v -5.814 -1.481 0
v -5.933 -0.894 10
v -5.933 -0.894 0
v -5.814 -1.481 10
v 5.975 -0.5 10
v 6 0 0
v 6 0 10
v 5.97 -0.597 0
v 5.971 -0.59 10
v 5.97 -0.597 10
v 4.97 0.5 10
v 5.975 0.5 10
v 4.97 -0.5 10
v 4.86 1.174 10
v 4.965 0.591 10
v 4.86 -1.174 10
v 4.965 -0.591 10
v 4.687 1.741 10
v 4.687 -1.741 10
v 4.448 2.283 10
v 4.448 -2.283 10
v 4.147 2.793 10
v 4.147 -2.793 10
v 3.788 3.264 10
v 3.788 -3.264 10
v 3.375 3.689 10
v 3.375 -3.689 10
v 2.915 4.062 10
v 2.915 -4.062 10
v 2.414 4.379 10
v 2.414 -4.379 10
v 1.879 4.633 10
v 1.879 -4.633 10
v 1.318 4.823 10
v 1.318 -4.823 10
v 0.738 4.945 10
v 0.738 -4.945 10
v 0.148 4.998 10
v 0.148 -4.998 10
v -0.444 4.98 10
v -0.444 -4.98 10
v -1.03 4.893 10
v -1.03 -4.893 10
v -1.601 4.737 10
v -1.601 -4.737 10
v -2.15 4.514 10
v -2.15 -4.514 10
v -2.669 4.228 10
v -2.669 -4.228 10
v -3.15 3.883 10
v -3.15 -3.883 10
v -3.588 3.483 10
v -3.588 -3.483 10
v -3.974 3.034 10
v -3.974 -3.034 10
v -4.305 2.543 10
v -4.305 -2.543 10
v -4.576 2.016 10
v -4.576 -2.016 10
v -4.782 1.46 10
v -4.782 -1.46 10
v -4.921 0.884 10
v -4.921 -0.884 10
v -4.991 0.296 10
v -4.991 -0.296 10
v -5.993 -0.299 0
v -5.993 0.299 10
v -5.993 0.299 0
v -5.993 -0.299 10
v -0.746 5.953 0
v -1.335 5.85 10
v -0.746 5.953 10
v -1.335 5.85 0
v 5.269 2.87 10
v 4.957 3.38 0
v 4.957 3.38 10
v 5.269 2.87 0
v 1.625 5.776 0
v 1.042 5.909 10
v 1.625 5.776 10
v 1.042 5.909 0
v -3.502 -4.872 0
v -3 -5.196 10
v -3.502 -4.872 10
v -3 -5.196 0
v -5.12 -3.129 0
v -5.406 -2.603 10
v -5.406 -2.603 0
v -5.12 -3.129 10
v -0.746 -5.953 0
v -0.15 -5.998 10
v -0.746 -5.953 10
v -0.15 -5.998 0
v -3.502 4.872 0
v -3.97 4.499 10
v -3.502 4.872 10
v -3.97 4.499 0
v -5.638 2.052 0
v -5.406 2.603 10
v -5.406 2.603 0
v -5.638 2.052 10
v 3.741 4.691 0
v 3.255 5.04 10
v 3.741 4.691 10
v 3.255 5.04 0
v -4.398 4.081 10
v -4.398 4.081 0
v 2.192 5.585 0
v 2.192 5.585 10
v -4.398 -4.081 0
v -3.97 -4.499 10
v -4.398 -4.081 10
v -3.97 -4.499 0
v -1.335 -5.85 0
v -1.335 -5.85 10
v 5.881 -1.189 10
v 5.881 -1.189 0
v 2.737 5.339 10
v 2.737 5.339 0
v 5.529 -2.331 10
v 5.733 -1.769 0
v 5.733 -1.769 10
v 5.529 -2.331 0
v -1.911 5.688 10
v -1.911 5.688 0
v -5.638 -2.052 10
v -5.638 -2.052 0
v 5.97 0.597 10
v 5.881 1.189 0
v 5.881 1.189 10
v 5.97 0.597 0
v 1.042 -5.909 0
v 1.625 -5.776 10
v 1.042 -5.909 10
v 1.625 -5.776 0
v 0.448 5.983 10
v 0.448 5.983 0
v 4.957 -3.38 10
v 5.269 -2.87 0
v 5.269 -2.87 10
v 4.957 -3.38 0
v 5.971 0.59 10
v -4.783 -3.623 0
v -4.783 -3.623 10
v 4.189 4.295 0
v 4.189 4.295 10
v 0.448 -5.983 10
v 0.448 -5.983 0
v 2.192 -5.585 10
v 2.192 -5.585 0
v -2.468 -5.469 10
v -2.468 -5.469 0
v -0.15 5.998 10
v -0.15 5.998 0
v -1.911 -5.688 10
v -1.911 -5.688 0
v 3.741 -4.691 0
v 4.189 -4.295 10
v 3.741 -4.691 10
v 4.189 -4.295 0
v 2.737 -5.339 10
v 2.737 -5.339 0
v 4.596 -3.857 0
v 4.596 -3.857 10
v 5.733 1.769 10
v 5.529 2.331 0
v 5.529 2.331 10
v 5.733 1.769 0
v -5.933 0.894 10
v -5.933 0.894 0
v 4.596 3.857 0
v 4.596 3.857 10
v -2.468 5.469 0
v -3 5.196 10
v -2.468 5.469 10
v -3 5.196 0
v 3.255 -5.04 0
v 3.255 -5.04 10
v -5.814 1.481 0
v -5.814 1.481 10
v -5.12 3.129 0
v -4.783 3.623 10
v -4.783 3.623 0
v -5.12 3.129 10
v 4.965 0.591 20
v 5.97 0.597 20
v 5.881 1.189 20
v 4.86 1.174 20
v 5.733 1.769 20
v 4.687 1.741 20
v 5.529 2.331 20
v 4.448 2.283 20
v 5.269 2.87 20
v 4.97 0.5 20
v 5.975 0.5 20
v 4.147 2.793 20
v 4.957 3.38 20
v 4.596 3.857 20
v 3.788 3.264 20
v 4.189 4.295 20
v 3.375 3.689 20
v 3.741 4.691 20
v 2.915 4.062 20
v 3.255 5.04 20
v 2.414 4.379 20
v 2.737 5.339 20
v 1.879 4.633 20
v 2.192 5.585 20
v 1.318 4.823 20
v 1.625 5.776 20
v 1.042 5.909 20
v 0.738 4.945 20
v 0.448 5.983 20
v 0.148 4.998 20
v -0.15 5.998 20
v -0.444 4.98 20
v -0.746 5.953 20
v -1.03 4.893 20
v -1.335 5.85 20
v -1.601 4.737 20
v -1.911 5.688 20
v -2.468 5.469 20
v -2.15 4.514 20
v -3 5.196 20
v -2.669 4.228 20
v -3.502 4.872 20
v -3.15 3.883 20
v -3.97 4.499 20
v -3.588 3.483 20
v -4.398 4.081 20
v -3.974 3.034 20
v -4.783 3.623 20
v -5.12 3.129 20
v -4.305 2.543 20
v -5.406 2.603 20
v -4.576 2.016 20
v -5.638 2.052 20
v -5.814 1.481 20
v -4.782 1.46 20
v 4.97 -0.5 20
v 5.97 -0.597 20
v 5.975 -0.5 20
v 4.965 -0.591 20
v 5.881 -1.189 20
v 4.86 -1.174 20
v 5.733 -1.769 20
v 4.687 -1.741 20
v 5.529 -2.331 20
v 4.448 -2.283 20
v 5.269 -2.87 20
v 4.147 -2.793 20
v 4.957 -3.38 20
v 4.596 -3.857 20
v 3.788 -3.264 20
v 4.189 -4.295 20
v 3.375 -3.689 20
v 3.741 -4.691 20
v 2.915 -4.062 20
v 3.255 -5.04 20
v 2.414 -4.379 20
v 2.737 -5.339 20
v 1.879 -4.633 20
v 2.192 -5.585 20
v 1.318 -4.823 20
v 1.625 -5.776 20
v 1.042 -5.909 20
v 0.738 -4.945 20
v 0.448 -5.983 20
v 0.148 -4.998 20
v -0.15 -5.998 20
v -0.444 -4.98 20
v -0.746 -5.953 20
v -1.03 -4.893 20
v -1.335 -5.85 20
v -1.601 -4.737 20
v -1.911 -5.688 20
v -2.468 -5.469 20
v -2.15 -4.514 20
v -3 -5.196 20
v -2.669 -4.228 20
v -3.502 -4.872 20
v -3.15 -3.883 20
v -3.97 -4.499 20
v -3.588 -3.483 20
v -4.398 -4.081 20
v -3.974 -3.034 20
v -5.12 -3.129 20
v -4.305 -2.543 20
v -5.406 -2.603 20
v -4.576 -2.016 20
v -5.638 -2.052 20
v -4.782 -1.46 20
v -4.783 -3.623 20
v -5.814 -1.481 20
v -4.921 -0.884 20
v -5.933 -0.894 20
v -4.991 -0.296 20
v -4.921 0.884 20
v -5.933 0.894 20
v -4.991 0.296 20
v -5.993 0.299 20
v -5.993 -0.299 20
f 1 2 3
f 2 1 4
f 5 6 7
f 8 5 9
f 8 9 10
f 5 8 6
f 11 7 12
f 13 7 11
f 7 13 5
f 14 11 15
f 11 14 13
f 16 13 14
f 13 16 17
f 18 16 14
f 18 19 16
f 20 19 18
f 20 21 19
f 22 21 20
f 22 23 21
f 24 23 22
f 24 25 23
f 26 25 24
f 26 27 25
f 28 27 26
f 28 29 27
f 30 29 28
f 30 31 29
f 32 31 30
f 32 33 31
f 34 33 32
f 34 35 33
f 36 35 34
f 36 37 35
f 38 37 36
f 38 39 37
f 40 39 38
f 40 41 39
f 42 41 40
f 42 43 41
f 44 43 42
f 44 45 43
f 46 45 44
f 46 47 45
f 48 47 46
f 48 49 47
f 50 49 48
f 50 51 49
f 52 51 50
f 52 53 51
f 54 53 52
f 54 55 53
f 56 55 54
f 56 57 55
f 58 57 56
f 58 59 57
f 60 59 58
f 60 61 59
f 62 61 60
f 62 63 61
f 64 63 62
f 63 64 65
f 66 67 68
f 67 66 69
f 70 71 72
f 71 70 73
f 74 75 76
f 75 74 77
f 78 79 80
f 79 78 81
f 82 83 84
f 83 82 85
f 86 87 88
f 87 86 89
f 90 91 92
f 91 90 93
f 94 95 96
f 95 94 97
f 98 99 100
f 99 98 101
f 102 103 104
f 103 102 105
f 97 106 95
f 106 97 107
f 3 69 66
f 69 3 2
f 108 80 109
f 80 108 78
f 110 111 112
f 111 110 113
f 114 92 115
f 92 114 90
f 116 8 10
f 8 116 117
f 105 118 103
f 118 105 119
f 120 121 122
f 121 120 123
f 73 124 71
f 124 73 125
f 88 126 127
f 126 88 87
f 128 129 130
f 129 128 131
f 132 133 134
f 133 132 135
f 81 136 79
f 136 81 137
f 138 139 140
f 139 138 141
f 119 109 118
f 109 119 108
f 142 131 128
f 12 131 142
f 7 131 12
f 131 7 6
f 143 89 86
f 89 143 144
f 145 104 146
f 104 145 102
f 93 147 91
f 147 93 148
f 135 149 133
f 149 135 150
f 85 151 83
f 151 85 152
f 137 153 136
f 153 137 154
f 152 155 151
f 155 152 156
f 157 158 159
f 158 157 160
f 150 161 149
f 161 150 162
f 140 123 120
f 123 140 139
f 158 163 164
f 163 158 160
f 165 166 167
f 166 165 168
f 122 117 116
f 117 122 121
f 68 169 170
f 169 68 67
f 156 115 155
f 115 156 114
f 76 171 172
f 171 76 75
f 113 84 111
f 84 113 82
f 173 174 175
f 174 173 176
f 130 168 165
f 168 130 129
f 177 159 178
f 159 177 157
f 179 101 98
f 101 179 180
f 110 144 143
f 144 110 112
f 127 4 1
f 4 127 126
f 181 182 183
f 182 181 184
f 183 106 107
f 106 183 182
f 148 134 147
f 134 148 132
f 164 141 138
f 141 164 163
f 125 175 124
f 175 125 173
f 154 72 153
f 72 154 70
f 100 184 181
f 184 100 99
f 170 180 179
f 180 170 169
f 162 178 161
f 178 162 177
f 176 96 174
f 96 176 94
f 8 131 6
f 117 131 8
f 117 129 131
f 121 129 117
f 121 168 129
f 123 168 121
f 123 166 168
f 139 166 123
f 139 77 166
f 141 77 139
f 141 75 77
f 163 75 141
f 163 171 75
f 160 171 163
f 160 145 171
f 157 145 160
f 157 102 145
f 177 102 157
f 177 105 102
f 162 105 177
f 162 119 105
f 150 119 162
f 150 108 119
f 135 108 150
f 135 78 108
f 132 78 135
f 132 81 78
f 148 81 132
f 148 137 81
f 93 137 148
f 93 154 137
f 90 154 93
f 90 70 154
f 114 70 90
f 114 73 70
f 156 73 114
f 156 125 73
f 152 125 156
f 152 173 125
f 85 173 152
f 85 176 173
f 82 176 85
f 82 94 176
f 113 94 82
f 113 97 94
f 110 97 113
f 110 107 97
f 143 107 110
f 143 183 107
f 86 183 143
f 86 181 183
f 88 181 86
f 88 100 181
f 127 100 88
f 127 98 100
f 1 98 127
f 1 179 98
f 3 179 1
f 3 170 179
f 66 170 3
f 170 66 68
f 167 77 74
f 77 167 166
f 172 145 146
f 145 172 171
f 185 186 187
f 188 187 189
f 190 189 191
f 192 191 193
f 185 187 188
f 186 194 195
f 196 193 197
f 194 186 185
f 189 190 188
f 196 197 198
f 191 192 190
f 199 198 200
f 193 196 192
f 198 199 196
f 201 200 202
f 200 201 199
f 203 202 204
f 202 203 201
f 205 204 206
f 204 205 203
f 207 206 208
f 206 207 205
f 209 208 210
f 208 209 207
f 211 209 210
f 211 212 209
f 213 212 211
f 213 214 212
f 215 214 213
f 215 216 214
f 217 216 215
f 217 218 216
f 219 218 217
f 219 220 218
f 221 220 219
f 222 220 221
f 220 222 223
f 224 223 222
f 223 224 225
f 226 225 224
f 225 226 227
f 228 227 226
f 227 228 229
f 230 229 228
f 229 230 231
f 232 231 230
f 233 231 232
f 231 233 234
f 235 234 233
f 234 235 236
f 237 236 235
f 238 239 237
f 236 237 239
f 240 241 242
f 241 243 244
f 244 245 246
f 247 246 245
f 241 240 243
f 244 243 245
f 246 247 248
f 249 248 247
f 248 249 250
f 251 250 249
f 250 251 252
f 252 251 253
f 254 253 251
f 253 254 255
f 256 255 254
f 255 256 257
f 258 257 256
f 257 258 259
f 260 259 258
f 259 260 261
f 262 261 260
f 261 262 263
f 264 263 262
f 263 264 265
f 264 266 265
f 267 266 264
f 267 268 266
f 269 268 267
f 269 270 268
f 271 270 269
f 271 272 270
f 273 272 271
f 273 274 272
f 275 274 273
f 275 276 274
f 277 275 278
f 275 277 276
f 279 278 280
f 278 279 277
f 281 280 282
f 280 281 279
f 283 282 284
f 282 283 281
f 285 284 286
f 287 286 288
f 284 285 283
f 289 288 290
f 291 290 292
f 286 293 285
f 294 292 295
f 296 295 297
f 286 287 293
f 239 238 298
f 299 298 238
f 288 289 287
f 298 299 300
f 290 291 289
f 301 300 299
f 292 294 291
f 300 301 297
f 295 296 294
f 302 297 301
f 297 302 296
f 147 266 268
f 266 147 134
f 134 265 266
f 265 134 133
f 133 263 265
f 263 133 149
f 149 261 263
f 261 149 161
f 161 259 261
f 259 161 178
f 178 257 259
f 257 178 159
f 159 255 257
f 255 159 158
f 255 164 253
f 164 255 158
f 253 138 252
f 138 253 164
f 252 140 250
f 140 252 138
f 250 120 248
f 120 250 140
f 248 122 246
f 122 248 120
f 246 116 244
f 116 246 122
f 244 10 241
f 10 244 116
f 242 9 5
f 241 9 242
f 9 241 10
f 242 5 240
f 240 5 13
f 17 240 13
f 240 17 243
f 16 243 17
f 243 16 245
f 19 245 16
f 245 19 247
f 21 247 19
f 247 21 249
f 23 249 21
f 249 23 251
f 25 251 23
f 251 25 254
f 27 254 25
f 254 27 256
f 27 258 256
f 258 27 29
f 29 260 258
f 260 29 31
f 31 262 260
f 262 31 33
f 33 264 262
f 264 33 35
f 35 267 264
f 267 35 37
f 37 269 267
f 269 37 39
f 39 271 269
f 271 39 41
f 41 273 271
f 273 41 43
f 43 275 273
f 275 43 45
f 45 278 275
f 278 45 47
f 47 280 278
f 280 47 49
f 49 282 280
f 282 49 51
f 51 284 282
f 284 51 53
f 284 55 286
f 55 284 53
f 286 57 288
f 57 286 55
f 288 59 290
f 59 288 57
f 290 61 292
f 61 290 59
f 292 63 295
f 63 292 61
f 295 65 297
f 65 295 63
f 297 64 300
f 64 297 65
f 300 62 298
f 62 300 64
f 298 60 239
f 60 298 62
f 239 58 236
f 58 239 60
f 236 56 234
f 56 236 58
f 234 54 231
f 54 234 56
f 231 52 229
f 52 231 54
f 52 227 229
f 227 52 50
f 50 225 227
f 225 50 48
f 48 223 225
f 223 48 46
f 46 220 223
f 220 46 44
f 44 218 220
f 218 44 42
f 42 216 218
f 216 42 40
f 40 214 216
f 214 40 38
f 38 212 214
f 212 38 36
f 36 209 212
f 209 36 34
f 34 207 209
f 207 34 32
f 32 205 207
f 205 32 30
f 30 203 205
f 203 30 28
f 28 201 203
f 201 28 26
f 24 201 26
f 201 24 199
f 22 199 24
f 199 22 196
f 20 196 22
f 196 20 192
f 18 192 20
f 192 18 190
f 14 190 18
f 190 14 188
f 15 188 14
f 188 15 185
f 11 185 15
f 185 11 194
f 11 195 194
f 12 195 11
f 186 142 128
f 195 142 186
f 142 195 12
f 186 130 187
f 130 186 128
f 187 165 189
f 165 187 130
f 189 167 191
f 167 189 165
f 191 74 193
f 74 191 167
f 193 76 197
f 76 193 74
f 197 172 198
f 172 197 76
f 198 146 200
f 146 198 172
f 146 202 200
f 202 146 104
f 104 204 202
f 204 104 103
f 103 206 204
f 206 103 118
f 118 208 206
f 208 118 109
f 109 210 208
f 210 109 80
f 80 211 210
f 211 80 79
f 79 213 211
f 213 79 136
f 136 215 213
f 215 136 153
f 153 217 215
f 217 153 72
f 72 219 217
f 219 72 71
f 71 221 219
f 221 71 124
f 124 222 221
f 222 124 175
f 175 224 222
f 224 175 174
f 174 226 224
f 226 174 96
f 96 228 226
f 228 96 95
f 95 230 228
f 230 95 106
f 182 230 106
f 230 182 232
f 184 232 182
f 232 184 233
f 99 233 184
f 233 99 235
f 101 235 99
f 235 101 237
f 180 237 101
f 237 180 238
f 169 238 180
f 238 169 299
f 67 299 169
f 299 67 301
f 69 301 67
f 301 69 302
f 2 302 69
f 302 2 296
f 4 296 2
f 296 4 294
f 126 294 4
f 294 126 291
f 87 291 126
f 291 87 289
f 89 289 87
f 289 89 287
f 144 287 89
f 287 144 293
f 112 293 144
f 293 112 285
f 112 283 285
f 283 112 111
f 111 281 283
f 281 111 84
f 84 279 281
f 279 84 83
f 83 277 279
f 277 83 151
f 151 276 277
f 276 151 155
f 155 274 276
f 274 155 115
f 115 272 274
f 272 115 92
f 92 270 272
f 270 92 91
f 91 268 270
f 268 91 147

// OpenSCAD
// This document uses MILLIMETRES as a unit.

// Set $fs (smallest arc fragment) to lower value than default 2.0
$fs = 0.6; // millimetres
$fa = 4;

module main()
{
    //  A cylinder; in  vase mode single wall
    linear_extrude(height=10.0) {
        circle(r=6.0);
    }
    // A piece with double wall in vase mode
    translate([0,0,10])
        linear_extrude(height=10.0) {
            difference() {
                circle(r=6.0);
                circle(r=5.0);
                translate([0,-0.5])
                    square([20,1]);

            }
        }
}

main();
